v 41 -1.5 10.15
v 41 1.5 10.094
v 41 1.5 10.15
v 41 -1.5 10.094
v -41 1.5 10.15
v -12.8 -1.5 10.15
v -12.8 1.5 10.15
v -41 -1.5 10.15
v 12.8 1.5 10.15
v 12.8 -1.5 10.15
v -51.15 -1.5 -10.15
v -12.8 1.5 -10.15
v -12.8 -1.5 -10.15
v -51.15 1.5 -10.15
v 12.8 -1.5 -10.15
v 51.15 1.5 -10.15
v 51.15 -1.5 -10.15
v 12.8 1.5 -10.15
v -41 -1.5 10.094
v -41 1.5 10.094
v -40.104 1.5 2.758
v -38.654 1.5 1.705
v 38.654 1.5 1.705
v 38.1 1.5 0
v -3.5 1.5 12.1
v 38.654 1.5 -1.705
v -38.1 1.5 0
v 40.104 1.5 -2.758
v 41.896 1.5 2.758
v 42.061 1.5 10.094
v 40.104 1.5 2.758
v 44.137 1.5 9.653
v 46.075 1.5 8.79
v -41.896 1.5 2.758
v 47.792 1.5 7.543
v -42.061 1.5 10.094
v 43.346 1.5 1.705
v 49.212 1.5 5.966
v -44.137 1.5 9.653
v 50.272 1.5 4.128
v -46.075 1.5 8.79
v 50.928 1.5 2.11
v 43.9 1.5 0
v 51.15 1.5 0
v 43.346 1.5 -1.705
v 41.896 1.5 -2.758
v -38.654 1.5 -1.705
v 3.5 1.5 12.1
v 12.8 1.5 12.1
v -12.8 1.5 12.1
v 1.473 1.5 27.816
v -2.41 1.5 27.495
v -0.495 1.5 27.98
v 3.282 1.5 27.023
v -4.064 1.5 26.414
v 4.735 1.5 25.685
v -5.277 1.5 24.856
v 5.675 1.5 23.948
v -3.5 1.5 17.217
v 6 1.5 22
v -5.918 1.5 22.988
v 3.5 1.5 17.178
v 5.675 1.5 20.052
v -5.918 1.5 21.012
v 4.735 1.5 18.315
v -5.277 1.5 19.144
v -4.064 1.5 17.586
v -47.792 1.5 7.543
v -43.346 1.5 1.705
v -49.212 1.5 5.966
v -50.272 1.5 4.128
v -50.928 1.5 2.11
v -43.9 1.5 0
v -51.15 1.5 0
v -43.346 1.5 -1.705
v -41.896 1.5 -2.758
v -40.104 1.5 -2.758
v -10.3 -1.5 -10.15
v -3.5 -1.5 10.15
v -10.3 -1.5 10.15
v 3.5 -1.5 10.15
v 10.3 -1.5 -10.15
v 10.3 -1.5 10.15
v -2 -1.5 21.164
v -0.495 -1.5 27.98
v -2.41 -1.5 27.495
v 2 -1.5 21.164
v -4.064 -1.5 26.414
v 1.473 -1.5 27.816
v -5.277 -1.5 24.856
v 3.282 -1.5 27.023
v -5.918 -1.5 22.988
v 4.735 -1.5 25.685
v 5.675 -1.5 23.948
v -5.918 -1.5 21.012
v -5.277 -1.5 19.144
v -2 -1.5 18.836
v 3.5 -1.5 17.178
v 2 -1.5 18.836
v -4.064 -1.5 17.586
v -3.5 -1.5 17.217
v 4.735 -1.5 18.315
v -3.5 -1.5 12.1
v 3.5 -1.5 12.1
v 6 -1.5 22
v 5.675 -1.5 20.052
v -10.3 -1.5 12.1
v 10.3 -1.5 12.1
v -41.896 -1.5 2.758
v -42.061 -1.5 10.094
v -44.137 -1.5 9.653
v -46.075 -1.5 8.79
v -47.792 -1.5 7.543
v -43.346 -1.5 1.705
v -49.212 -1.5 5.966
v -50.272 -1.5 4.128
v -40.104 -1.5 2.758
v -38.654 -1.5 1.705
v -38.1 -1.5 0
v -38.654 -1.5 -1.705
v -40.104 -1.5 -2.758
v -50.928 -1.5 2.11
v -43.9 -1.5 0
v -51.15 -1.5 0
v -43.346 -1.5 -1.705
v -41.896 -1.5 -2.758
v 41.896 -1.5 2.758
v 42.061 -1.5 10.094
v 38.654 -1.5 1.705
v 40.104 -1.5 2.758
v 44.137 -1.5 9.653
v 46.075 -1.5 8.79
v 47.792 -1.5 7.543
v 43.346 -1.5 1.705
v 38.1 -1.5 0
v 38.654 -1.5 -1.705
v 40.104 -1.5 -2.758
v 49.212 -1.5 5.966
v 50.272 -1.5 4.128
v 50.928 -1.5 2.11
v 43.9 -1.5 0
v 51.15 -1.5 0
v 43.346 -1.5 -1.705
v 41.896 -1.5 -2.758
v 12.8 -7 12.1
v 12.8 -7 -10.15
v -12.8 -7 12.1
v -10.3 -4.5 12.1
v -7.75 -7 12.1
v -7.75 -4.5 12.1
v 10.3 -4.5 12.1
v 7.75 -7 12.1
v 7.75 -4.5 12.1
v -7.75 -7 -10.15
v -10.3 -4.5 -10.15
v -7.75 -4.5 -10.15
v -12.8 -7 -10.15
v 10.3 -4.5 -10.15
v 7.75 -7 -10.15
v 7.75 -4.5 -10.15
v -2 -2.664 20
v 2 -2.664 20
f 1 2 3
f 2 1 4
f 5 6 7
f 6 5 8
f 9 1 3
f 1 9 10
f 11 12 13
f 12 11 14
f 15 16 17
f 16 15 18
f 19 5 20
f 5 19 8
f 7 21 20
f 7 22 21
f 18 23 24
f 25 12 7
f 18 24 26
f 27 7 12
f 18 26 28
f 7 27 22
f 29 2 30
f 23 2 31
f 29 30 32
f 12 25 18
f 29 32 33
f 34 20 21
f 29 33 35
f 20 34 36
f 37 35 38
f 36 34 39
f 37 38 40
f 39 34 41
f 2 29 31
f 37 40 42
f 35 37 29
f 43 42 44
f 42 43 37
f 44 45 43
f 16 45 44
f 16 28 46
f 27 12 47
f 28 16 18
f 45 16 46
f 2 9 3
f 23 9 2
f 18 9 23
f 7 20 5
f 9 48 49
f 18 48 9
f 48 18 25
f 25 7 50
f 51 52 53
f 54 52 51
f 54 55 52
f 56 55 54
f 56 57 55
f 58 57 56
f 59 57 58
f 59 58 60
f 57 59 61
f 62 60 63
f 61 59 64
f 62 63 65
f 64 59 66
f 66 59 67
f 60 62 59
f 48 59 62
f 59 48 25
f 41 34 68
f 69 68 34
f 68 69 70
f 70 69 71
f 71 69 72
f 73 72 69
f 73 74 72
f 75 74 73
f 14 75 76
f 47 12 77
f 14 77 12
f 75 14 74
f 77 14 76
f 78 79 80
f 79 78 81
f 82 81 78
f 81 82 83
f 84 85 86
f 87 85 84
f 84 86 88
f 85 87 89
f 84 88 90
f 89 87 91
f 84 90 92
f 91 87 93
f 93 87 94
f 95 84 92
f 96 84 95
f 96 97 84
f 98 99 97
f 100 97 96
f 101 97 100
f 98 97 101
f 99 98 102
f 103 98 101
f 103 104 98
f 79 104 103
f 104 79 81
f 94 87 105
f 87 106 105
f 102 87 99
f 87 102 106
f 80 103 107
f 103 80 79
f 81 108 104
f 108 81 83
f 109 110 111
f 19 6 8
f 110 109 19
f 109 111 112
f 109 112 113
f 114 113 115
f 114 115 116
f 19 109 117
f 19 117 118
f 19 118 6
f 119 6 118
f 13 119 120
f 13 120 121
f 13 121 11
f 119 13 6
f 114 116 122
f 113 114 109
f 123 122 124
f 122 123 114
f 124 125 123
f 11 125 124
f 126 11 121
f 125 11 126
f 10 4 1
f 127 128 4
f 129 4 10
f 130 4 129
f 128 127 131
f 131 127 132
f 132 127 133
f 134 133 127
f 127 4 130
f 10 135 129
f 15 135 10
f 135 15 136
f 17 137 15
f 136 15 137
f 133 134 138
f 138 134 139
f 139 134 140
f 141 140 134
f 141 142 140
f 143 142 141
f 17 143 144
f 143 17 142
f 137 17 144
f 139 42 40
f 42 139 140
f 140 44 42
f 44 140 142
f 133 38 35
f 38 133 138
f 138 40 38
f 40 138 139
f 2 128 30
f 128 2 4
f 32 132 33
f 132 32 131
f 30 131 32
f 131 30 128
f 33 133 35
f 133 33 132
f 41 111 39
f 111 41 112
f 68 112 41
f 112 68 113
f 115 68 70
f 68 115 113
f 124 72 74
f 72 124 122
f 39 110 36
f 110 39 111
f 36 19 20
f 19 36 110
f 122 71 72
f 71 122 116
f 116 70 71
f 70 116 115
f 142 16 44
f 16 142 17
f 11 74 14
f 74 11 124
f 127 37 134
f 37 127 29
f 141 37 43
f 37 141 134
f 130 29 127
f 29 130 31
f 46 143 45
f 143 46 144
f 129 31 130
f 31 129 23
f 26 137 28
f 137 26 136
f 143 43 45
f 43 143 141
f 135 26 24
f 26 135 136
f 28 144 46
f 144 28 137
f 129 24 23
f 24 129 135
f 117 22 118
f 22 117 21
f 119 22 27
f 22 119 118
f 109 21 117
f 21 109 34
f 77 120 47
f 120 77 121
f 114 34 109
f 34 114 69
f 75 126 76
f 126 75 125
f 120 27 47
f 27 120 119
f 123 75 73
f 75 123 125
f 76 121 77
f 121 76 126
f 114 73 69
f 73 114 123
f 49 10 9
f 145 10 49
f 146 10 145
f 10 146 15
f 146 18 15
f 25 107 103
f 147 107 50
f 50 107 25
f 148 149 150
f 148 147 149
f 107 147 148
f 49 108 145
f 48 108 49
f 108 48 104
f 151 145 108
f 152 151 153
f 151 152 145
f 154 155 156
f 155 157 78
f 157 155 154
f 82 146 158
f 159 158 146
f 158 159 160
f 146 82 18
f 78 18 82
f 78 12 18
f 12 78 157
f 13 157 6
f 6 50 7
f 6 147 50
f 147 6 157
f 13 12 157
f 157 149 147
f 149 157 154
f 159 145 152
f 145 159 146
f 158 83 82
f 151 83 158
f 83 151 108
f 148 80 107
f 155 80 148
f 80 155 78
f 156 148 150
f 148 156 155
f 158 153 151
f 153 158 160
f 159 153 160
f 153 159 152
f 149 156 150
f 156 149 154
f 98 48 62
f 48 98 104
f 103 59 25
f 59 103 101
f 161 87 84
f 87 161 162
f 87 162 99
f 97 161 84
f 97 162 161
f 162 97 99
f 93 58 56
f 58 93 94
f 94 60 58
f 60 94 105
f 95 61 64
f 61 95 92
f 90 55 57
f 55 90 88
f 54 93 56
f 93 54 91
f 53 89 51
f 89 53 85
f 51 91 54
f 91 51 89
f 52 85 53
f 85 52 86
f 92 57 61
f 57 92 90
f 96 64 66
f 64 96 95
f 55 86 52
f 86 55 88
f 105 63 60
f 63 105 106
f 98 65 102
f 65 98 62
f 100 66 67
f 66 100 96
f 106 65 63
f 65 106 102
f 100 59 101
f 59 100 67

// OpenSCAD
/*

Adapter for bike light to rack
Gian Pablo Villamil
May 30, 2011

*/

bracket_height = 22.25;
tongue_width = 20.6;
tongue_thickness = 3;
base_width = 15.5;
base_thickness = 2.5;
side_thickness = 2.5;

plate_thickness = 3;
plate_width = 100;
plate_height = 20.3;

hole_dia = 5.8 ;
hole_sep = 82 ;

module plate() {
	difference() {
		union() {
			cube(size= [hole_sep, plate_thickness, plate_height], center = true);
			translate ([hole_sep/2,0,0]) rotate (a = 90, v = [1,0,0]) 
				cylinder(h = plate_thickness, r = plate_height/2, center = true);
			translate ([-hole_sep/2,0,0]) rotate (a = 90, v = [1,0,0]) 
				cylinder(h = plate_thickness, r = plate_height/2, center = true);
			translate ([hole_sep/2+plate_height/4,0,-plate_height/4])
				cube(size = [plate_height/2,plate_thickness,plate_height/2],center = true);
			translate ([-(hole_sep/2+plate_height/4),0,-plate_height/4])
				cube(size = [plate_height/2,plate_thickness,plate_height/2],center = true);

		}
		translate ([hole_sep/2,0,0]) rotate (a = 90, v = [1,0,0]) 
			cylinder(h = plate_thickness+2, r = hole_dia/2, center = true);
		translate ([-hole_sep/2,0,0]) rotate (a = 90, v = [1,0,0]) 
			cylinder(h = plate_thickness+2, r = hole_dia/2, center = true);
	};
};

module bracket() {
	difference(){
		translate([-(tongue_width+(side_thickness *2))/2,0,0])
		cube(size = [tongue_width+(side_thickness * 2),plate_thickness+tongue_thickness+base_thickness, bracket_height], center = false);
		translate([-tongue_width/2,2.5,0])
		cube(size = [tongue_width, tongue_thickness, bracket_height], center=false);
		translate([-base_width/2,0,0])
		cube(size = [base_width, base_thickness, bracket_height], center=false);
	};
};

module release() {
	union() {
		translate([-3.5,-plate_thickness/2,0])
		#cube(size = [7, plate_thickness, 10], center = false);
		translate([0,-1.25,10]) rotate(a = 45, v = [1,0,0])
		cube(size = [4,2,2], center = true);
		translate([0,plate_thickness/2,12]) rotate(a = 90, v = [1,0,0])
		cylinder(h = plate_thickness, r = 6);
	};
}


union() {
plate();
translate([0,-7,-plate_height/2])
bracket();}
translate([0,0,10])
release();
